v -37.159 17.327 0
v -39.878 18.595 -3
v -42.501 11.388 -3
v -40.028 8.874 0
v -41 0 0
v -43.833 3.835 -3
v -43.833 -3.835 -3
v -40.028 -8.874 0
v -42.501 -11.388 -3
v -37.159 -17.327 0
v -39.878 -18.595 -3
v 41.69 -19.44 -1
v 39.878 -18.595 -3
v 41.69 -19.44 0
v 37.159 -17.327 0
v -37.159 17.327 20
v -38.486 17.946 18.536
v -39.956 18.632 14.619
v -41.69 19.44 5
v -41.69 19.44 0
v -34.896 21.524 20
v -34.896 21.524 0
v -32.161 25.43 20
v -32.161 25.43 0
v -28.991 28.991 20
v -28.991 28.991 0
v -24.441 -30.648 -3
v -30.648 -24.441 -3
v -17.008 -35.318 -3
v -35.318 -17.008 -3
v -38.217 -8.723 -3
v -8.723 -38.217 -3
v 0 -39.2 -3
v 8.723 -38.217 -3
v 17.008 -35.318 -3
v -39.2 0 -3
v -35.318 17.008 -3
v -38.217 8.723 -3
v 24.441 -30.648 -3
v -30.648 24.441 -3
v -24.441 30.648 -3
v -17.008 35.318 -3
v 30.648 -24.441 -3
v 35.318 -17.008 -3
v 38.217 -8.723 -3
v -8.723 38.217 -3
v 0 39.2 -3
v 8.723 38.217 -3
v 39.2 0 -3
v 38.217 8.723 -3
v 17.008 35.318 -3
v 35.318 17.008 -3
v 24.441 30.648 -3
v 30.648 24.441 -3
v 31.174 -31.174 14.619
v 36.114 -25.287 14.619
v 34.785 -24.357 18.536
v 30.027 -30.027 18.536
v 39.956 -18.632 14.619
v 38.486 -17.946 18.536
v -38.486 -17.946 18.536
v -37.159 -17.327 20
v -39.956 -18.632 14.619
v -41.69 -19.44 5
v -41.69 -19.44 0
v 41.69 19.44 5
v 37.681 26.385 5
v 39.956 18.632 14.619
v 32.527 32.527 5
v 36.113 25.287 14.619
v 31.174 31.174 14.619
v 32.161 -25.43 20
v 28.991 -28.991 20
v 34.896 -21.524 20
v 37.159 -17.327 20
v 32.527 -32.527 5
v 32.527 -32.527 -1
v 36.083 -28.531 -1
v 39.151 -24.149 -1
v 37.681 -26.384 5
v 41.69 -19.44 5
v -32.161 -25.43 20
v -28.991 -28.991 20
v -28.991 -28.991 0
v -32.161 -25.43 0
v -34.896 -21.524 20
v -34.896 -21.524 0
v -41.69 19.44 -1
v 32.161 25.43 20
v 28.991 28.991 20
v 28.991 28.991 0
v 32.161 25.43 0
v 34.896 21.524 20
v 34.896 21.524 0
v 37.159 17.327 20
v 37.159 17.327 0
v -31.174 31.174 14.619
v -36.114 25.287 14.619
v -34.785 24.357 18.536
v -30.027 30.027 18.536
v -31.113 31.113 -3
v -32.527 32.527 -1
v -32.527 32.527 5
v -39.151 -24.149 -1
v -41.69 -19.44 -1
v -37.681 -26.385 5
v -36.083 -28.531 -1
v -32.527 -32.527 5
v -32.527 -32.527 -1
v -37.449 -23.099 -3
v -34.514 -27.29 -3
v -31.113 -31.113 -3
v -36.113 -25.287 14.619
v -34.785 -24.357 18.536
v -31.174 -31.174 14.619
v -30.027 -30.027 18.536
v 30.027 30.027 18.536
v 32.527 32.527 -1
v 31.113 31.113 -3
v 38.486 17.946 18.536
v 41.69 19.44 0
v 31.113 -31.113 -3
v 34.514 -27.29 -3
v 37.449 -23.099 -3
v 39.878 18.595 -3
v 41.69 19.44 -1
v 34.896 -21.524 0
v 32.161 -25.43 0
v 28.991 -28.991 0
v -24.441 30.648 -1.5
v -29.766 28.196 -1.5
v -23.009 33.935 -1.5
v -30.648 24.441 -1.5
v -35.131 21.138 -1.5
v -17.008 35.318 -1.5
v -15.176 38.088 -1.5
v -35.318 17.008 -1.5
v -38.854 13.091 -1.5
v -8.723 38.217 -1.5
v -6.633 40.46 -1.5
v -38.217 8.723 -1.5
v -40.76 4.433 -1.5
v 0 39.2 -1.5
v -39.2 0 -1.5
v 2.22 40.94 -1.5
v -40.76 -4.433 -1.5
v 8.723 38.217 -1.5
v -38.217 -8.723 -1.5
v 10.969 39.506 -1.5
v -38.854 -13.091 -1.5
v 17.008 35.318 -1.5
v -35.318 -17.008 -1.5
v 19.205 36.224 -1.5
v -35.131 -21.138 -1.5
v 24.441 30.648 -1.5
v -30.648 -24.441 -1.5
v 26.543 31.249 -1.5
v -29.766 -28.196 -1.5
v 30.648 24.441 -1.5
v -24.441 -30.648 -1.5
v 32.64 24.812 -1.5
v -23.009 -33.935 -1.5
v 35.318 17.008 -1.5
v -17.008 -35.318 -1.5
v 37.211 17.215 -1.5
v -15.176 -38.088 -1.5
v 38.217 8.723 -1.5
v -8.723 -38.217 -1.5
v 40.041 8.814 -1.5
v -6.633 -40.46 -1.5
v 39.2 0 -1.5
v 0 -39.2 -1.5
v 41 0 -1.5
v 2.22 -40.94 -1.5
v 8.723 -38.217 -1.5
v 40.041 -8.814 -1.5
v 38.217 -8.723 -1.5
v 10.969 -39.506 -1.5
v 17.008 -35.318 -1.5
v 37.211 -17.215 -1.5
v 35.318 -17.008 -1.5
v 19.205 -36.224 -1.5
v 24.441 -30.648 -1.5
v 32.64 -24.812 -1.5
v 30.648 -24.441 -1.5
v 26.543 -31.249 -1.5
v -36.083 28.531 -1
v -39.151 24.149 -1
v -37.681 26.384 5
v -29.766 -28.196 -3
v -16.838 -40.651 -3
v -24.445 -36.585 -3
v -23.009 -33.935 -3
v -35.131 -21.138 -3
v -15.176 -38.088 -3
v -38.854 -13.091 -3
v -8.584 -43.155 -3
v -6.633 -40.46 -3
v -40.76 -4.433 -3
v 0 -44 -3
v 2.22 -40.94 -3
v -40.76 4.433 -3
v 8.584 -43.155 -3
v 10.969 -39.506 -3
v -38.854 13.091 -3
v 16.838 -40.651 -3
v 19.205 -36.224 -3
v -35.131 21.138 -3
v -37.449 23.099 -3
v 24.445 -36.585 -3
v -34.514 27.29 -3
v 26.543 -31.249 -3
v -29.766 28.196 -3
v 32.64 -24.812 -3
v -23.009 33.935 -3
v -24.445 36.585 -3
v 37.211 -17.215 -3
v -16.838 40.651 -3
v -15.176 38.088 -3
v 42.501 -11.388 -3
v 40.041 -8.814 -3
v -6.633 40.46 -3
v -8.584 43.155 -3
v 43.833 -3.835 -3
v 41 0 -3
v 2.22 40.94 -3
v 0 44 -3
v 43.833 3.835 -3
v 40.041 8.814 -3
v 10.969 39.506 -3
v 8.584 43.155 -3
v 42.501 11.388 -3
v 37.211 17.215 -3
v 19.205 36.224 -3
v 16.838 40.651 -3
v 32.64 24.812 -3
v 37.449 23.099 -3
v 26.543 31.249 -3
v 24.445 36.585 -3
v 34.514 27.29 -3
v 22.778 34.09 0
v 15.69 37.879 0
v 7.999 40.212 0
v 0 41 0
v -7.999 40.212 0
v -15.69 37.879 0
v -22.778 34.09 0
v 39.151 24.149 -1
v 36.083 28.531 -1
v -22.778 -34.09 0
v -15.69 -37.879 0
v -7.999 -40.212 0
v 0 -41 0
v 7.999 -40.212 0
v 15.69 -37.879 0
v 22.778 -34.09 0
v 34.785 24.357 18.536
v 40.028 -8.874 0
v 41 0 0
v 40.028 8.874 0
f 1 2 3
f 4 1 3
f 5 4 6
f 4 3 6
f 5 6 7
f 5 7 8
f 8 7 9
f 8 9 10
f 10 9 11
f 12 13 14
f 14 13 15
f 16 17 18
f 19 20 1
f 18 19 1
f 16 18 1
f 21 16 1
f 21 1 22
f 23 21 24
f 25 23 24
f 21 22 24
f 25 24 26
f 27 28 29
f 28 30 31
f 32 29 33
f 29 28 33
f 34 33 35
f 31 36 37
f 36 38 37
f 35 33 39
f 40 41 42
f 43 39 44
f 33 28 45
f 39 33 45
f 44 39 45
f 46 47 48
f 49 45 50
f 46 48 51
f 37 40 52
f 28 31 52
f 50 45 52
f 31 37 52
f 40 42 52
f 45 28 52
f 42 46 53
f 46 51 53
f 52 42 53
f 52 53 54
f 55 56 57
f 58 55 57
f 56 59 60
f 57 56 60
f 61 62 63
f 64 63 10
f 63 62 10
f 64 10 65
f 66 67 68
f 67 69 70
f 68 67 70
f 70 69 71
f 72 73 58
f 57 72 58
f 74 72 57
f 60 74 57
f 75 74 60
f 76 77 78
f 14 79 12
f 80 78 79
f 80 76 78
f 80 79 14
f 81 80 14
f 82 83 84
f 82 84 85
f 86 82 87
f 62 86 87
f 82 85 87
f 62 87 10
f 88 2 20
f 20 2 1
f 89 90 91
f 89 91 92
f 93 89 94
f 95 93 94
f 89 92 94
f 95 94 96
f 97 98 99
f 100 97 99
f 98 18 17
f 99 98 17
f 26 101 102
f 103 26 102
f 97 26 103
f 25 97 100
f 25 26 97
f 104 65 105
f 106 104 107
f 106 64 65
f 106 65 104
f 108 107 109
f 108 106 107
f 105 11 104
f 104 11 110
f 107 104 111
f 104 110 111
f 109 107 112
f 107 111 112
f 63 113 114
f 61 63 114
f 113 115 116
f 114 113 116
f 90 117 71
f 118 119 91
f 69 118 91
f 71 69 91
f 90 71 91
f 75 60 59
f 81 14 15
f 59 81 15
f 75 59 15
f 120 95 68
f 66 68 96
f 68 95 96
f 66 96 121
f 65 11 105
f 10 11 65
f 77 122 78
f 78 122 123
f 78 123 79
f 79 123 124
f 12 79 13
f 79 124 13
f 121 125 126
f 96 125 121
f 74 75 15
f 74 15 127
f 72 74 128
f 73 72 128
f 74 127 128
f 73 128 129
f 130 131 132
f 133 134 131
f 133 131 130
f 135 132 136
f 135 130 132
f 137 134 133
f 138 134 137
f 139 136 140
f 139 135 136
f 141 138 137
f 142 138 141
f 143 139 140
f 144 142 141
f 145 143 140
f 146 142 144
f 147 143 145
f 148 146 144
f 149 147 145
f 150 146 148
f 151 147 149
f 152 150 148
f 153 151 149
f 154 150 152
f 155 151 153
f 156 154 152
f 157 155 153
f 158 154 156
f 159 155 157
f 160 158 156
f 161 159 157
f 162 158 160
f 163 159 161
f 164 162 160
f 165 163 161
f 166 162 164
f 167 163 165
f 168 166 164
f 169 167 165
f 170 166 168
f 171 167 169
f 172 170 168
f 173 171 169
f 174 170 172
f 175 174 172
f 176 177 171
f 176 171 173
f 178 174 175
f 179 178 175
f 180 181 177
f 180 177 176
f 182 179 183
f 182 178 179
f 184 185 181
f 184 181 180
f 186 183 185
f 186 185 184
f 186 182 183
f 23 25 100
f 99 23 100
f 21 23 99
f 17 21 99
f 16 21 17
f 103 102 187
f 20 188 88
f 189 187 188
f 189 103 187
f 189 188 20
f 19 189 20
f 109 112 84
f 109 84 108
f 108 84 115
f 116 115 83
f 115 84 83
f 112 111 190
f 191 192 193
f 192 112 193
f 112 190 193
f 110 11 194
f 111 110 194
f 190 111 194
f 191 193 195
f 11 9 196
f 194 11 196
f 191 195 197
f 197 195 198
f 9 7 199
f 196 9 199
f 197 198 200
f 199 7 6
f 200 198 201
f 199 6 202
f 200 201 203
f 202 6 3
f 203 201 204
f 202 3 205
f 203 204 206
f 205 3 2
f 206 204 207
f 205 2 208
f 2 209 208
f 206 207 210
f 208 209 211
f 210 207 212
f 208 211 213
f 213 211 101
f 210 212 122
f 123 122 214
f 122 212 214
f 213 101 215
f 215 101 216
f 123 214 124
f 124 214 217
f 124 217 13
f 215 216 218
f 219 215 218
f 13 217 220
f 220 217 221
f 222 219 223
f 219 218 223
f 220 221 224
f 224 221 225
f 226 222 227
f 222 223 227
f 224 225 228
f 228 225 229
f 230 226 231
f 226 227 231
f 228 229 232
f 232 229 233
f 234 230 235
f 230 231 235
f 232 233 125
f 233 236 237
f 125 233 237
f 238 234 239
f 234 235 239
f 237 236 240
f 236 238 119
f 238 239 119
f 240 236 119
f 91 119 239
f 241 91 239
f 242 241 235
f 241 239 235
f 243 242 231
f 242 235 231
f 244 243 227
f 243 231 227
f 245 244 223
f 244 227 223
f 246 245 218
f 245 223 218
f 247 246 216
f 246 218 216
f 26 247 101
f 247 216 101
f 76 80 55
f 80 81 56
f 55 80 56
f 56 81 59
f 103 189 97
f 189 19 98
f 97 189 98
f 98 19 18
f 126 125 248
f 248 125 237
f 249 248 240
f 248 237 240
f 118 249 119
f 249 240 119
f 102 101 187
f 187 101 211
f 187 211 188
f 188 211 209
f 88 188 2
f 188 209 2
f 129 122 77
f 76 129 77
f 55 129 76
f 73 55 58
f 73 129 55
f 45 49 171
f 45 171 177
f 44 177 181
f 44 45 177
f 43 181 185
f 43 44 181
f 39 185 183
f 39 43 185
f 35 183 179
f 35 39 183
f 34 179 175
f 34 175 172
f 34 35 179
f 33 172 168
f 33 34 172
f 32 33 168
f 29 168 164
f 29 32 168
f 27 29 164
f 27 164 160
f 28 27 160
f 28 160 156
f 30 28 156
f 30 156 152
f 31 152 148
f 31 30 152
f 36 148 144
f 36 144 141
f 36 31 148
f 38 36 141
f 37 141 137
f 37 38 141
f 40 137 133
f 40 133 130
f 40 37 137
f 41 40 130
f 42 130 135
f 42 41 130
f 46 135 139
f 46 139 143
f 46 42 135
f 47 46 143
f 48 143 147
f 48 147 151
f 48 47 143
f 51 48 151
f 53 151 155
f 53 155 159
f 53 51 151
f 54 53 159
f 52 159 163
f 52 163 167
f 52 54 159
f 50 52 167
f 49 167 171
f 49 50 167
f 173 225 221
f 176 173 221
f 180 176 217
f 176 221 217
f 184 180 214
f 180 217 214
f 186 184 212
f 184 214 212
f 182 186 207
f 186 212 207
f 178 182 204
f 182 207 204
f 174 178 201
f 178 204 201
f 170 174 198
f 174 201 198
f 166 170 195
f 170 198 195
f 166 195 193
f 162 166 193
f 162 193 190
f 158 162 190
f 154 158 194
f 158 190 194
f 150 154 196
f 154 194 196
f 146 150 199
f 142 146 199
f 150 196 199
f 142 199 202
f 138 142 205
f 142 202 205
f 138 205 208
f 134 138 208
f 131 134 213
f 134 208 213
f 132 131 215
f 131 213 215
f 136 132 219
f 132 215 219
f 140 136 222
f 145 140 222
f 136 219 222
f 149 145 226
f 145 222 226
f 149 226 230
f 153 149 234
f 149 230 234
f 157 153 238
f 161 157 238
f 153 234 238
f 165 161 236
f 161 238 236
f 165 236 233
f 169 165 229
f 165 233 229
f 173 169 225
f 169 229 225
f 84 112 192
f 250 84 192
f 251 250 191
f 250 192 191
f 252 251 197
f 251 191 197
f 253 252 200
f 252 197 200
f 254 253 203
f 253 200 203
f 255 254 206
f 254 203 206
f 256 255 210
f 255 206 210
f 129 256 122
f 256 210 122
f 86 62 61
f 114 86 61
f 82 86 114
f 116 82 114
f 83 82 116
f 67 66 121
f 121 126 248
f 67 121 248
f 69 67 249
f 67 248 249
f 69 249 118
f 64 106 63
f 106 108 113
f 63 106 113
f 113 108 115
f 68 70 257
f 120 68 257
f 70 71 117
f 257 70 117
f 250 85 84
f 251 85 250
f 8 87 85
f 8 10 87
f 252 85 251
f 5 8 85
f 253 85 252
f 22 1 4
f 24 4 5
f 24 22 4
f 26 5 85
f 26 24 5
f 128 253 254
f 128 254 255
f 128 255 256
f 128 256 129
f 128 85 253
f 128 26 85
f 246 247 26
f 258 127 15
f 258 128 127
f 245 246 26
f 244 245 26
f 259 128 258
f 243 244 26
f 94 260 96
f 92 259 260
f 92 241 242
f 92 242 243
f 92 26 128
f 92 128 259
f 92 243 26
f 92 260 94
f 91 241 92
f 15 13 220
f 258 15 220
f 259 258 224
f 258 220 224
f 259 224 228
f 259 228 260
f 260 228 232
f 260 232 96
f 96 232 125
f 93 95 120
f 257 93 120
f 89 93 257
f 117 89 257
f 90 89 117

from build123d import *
from build123d import SkipClean  # not in build123d's __all__

# Parameters (mm, degrees)
F1_DEPTH    = 20
F2_SIZE     = 4.99999
F2_2_SIZE   = 4.99999
F2_3_SIZE   = 4.99999
F2_4_SIZE   = 4.99999
F3_DEPTH    = 3
F4_SIZE     = 5
F5_R        = 41
F5_R_2      = 39.2
F6_DEPTH    = 1.5
F7_SIZE     = 5
F8_T2_ANGLE = 50
F8_T4_ANGLE = 90
F8_T6_ANGLE = 50
F8_T8_ANGLE = 90
F9_SIZE     = 2


# Not quite as in the source:
# - a fillet or chamfer that OpenCascade refuses, or shapes differently, is made with other operations: its cross-section is extruded or revolved along the edge and cut away or added
# - a fillet or chamfer is up to 0.001 mm smaller than in the source, because OpenCascade refuses the exact size


with BuildPart() as f1:
    # F0 (on Top) → F1 (new body)
    with BuildSketch(Plane.XY):
        with BuildLine():
            ThreePointArc((-37.1586192685, 17.3273487314), (-33.5852338158, 23.5166338904), (-28.9913780286, 28.9913780286))
            Line((-28.9913780286, 28.9913780286), (-32.5269119346, 32.5269119346))
            ThreePointArc((-32.5269119346, 32.5269119346), (-37.6809940373, 26.3845160721), (-41.6901582037, 19.4404400401))
            Line((-41.6901582037, 19.4404400401), (-37.1586192685, 17.3273487314))
        make_face()
    extrude(amount=F1_DEPTH)

    # F2 (size 5 in the source; OpenCascade refuses exactly that, so slightly less here)
    f2_edges = [f1.edges().sort_by_distance(p)[0] for p in [
        (-37.680994, 26.384516, 20),
    ]]
    chamfer(f2_edges, length=F2_SIZE)



with BuildPart() as f1b:
    # F0 (on Top) → F1, piece 2 (new body)
    with BuildSketch(Plane.XY):
        with BuildLine():
            ThreePointArc((28.9913780286, 28.9913780286), (33.5852338158, 23.5166338904), (37.1586192685, 17.3273487314))
            Line((37.1586192685, 17.3273487314), (41.6901582037, 19.4404400401))
            ThreePointArc((41.6901582037, 19.4404400401), (37.6809940373, 26.3845160721), (32.5269119346, 32.5269119346))
            Line((32.5269119346, 32.5269119346), (28.9913780286, 28.9913780286))
        make_face()
    extrude(amount=F1_DEPTH)

    # F2#2 (size 5 in the source; OpenCascade refuses exactly that, so slightly less here)
    f2_2_edges = [f1b.edges().sort_by_distance(p)[0] for p in [
        (37.680994, 26.384516, 20),
    ]]
    chamfer(f2_2_edges, length=F2_2_SIZE)


with BuildPart() as f1c:
    # F0 (on Top) → F1, piece 3 (new body)
    with BuildSketch(Plane.XY):
        with BuildLine():
            Line((-32.5269119346, -32.5269119346), (-28.9913780286, -28.9913780286))
            ThreePointArc((-28.9913780286, -28.9913780286), (-33.5852338158, -23.5166338904), (-37.1586192685, -17.3273487314))
            Line((-37.1586192685, -17.3273487314), (-41.6901582037, -19.4404400401))
            ThreePointArc((-41.6901582037, -19.4404400401), (-37.6809940373, -26.3845160721), (-32.5269119346, -32.5269119346))
        make_face()
    extrude(amount=F1_DEPTH)

    # F2#3 (size 5 in the source; OpenCascade refuses exactly that, so slightly less here)
    f2_3_edges = [f1c.edges().sort_by_distance(p)[0] for p in [
        (-37.680994, -26.384516, 20),
    ]]
    chamfer(f2_3_edges, length=F2_3_SIZE)


with BuildPart() as f1d:
    # F0 (on Top) → F1, piece 4 (new body)
    with BuildSketch(Plane.XY):
        with BuildLine():
            Line((41.6901582037, -19.4404400401), (37.1586192685, -17.3273487314))
            ThreePointArc((37.1586192685, -17.3273487314), (33.5852338158, -23.5166338904), (28.9913780286, -28.9913780286))
            Line((28.9913780286, -28.9913780286), (32.5269119346, -32.5269119346))
            ThreePointArc((32.5269119346, -32.5269119346), (37.6809940373, -26.3845160721), (41.6901582037, -19.4404400401))
        make_face()
    extrude(amount=F1_DEPTH)

    # F2#4 (size 5 in the source; OpenCascade refuses exactly that, so slightly less here)
    f2_4_edges = [f1d.edges().sort_by_distance(p)[0] for p in [
        (37.680994, -26.384516, 20),
    ]]
    chamfer(f2_4_edges, length=F2_4_SIZE)


with BuildPart() as f1_1:
    add(f1.part, clean=False)

    with SkipClean():  # cleaning this boolean's faces spoils the solid; the shape is the same uncleaned
        add(f1b.part)  # F3 merges F1b

    with SkipClean():  # cleaning this boolean's faces spoils the solid; the shape is the same uncleaned
        add(f1c.part)  # F3 merges F1c

    with SkipClean():  # cleaning this boolean's faces spoils the solid; the shape is the same uncleaned
        add(f1d.part)  # F3 merges F1d
    # F0 (on Top) → F3 (join)
    with BuildSketch(Plane.XY):
        with BuildLine():
            ThreePointArc((-37.1586192685, 17.3273487314), (-33.5852338158, 23.5166338904), (-28.9913780286, 28.9913780286))
            Line((-28.9913780286, 28.9913780286), (-32.5269119346, 32.5269119346))
            ThreePointArc((-32.5269119346, 32.5269119346), (-37.6809940373, 26.3845160721), (-41.6901582037, 19.4404400401))
            Line((-41.6901582037, 19.4404400401), (-37.1586192685, 17.3273487314))
        make_face()
        with BuildLine():
            Line((32.5269119346, -32.5269119346), (28.9913780286, -28.9913780286))
            ThreePointArc((28.9913780286, -28.9913780286), (0, -41), (-28.9913780286, -28.9913780286))
            Line((-28.9913780286, -28.9913780286), (-32.5269119346, -32.5269119346))
            ThreePointArc((-32.5269119346, -32.5269119346), (0, -46), (32.5269119346, -32.5269119346))
        make_face()
        with BuildLine():
            ThreePointArc((28.9913780286, 28.9913780286), (33.5852338158, 23.5166338904), (37.1586192685, 17.3273487314))
            Line((37.1586192685, 17.3273487314), (41.6901582037, 19.4404400401))
            ThreePointArc((41.6901582037, 19.4404400401), (37.6809940373, 26.3845160721), (32.5269119346, 32.5269119346))
            Line((32.5269119346, 32.5269119346), (28.9913780286, 28.9913780286))
        make_face()
        with BuildLine():
            ThreePointArc((-28.9913780286, 28.9913780286), (0, 41), (28.9913780286, 28.9913780286))
            Line((28.9913780286, 28.9913780286), (32.5269119346, 32.5269119346))
            ThreePointArc((32.5269119346, 32.5269119346), (0, 46), (-32.5269119346, 32.5269119346))
            Line((-32.5269119346, 32.5269119346), (-28.9913780286, 28.9913780286))
        make_face()
        with BuildLine():
            ThreePointArc((37.1586192685, -17.3273487314), (40.0281362919, -8.8740241715), (41, 0))
            ThreePointArc((41, 0), (40.0281362919, 8.8740241715), (37.1586192685, 17.3273487314))
            ThreePointArc((37.1586192685, 17.3273487314), (33.5852338158, 23.5166338904), (28.9913780286, 28.9913780286))
            ThreePointArc((28.9913780286, 28.9913780286), (0, 41), (-28.9913780286, 28.9913780286))
            ThreePointArc((-28.9913780286, 28.9913780286), (-33.5852338158, 23.5166338904), (-37.1586192685, 17.3273487314))
            ThreePointArc((-37.1586192685, 17.3273487314), (-41, 0), (-37.1586192685, -17.3273487314))
            ThreePointArc((-37.1586192685, -17.3273487314), (-33.5852338158, -23.5166338904), (-28.9913780286, -28.9913780286))
            ThreePointArc((-28.9913780286, -28.9913780286), (0, -41), (28.9913780286, -28.9913780286))
            ThreePointArc((28.9913780286, -28.9913780286), (33.5852338158, -23.5166338904), (37.1586192685, -17.3273487314))
        make_face()
        with BuildLine():
            Line((-32.5269119346, -32.5269119346), (-28.9913780286, -28.9913780286))
            ThreePointArc((-28.9913780286, -28.9913780286), (-33.5852338158, -23.5166338904), (-37.1586192685, -17.3273487314))
            Line((-37.1586192685, -17.3273487314), (-41.6901582037, -19.4404400401))
            ThreePointArc((-41.6901582037, -19.4404400401), (-37.6809940373, -26.3845160721), (-32.5269119346, -32.5269119346))
        make_face()
        with BuildLine():
            Line((41.6901582037, -19.4404400401), (37.1586192685, -17.3273487314))
            ThreePointArc((37.1586192685, -17.3273487314), (33.5852338158, -23.5166338904), (28.9913780286, -28.9913780286))
            Line((28.9913780286, -28.9913780286), (32.5269119346, -32.5269119346))
            ThreePointArc((32.5269119346, -32.5269119346), (37.6809940373, -26.3845160721), (41.6901582037, -19.4404400401))
        make_face()
        with BuildLine():
            ThreePointArc((37.1586192685, 17.3273487314), (40.0281362919, 8.8740241715), (41, 0))
            ThreePointArc((41, 0), (40.0281362919, -8.8740241715), (37.1586192685, -17.3273487314))
            Line((37.1586192685, -17.3273487314), (41.6901582037, -19.4404400401))
            ThreePointArc((41.6901582037, -19.4404400401), (44.9096163275, -9.9562222412), (46, 0))
            ThreePointArc((46, 0), (44.9096163275, 9.9562222412), (41.6901582037, 19.4404400401))
            Line((41.6901582037, 19.4404400401), (37.1586192685, 17.3273487314))
        make_face()
        with BuildLine():
            ThreePointArc((-37.1586192685, -17.3273487314), (-41, 0), (-37.1586192685, 17.3273487314))
            Line((-37.1586192685, 17.3273487314), (-41.6901582037, 19.4404400401))
            ThreePointArc((-41.6901582037, 19.4404400401), (-46, 0), (-41.6901582037, -19.4404400401))
            Line((-41.6901582037, -19.4404400401), (-37.1586192685, -17.3273487314))
        make_face()
    with SkipClean():  # cleaning this boolean's faces spoils the solid; the shape is the same uncleaned
        extrude(amount=-F3_DEPTH)

    # F4
    f4_edges = [f1_1.edges().sort_by_distance(p)[0] for p in [
        (-37.680994, -26.384516, 15.00001),
        (-37.680994, 26.384516, 15.00001),
        (37.680994, -26.384516, 15.00001),
        (37.680994, 26.384516, 15.00001),
    ]]
    chamfer(f4_edges, length=F4_SIZE)

    # F5 (on face) → F6 (cut)
    with BuildSketch(Plane(origin=(0, 0, -3), x_dir=(1, 0, 0), z_dir=(0, 0, -1))):
        Circle(F5_R)
        Circle(F5_R_2, mode=Mode.SUBTRACT)
    with SkipClean():  # cleaning this boolean's faces spoils the solid; the shape is the same uncleaned
        extrude(amount=-F6_DEPTH, mode=Mode.SUBTRACT)

    # F7
    f7_edges = [f1_1.edges().sort_by_distance(p)[0] for p in [
        (-37.680994, -26.384516, 10.00001),
        (37.680994, -26.384516, 10.00001),
        (37.680994, 26.384516, 10.00001),
        (-37.680994, 26.384516, 10.00001),
    ]]
    chamfer(f7_edges, length=F7_SIZE)

    # F8: chamfer of 5 on 4 edges, made by hand

    # F8_s1 → F8_t2 (revolve, cut)
    with BuildSketch(Plane(origin=(0, 0, 0), x_dir=(0, 0, 1), z_dir=(0.4226182617, 0.906307787, 0))):
        Polygon((0, -41), (-5, -46), (0, -46), align=None)
    revolve(axis=Axis((0, 0, 0), (0, 0, 1)), revolution_arc=F8_T2_ANGLE, mode=Mode.SUBTRACT)

    # F8_s3 → F8_t4 (revolve, cut)
    with BuildSketch(Plane(origin=(0, 0, 0), x_dir=(0, 0, 1), z_dir=(0.7071067812, -0.7071067812, 0))):
        Polygon((0, -41), (-5, -46), (0, -46), align=None)
    revolve(axis=Axis((0, 0, 0), (0, 0, 1)), revolution_arc=F8_T4_ANGLE, mode=Mode.SUBTRACT)

    # F8_s5 → F8_t6 (revolve, cut)
    with BuildSketch(Plane(origin=(0, 0, 0), x_dir=(0, 0, 1), z_dir=(-0.4226182617, -0.906307787, 0))):
        Polygon((0, -41), (-5, -46), (0, -46), align=None)
    revolve(axis=Axis((0, 0, 0), (0, 0, 1)), revolution_arc=F8_T6_ANGLE, mode=Mode.SUBTRACT)

    # F8_s7 → F8_t8 (revolve, cut)
    with BuildSketch(Plane(origin=(0, 0, 0), x_dir=(0, 0, 1), z_dir=(-0.7071067812, 0.7071067812, 0))):
        Polygon((0, -41), (-5, -46), (0, -46), align=None)
    revolve(axis=Axis((0, 0, 0), (0, 0, 1)), revolution_arc=F8_T8_ANGLE, mode=Mode.SUBTRACT)

    # F9
    f9_edges = [f1_1.edges().sort_by_distance(p)[0] for p in [
        (-37.680994, -26.384516, -3),
        (37.680994, -26.384516, -3),
        (37.680994, 26.384516, -3),
        (-37.680994, 26.384516, -3),
    ]]
    chamfer(f9_edges, length=F9_SIZE)


solid = f1_1.part
